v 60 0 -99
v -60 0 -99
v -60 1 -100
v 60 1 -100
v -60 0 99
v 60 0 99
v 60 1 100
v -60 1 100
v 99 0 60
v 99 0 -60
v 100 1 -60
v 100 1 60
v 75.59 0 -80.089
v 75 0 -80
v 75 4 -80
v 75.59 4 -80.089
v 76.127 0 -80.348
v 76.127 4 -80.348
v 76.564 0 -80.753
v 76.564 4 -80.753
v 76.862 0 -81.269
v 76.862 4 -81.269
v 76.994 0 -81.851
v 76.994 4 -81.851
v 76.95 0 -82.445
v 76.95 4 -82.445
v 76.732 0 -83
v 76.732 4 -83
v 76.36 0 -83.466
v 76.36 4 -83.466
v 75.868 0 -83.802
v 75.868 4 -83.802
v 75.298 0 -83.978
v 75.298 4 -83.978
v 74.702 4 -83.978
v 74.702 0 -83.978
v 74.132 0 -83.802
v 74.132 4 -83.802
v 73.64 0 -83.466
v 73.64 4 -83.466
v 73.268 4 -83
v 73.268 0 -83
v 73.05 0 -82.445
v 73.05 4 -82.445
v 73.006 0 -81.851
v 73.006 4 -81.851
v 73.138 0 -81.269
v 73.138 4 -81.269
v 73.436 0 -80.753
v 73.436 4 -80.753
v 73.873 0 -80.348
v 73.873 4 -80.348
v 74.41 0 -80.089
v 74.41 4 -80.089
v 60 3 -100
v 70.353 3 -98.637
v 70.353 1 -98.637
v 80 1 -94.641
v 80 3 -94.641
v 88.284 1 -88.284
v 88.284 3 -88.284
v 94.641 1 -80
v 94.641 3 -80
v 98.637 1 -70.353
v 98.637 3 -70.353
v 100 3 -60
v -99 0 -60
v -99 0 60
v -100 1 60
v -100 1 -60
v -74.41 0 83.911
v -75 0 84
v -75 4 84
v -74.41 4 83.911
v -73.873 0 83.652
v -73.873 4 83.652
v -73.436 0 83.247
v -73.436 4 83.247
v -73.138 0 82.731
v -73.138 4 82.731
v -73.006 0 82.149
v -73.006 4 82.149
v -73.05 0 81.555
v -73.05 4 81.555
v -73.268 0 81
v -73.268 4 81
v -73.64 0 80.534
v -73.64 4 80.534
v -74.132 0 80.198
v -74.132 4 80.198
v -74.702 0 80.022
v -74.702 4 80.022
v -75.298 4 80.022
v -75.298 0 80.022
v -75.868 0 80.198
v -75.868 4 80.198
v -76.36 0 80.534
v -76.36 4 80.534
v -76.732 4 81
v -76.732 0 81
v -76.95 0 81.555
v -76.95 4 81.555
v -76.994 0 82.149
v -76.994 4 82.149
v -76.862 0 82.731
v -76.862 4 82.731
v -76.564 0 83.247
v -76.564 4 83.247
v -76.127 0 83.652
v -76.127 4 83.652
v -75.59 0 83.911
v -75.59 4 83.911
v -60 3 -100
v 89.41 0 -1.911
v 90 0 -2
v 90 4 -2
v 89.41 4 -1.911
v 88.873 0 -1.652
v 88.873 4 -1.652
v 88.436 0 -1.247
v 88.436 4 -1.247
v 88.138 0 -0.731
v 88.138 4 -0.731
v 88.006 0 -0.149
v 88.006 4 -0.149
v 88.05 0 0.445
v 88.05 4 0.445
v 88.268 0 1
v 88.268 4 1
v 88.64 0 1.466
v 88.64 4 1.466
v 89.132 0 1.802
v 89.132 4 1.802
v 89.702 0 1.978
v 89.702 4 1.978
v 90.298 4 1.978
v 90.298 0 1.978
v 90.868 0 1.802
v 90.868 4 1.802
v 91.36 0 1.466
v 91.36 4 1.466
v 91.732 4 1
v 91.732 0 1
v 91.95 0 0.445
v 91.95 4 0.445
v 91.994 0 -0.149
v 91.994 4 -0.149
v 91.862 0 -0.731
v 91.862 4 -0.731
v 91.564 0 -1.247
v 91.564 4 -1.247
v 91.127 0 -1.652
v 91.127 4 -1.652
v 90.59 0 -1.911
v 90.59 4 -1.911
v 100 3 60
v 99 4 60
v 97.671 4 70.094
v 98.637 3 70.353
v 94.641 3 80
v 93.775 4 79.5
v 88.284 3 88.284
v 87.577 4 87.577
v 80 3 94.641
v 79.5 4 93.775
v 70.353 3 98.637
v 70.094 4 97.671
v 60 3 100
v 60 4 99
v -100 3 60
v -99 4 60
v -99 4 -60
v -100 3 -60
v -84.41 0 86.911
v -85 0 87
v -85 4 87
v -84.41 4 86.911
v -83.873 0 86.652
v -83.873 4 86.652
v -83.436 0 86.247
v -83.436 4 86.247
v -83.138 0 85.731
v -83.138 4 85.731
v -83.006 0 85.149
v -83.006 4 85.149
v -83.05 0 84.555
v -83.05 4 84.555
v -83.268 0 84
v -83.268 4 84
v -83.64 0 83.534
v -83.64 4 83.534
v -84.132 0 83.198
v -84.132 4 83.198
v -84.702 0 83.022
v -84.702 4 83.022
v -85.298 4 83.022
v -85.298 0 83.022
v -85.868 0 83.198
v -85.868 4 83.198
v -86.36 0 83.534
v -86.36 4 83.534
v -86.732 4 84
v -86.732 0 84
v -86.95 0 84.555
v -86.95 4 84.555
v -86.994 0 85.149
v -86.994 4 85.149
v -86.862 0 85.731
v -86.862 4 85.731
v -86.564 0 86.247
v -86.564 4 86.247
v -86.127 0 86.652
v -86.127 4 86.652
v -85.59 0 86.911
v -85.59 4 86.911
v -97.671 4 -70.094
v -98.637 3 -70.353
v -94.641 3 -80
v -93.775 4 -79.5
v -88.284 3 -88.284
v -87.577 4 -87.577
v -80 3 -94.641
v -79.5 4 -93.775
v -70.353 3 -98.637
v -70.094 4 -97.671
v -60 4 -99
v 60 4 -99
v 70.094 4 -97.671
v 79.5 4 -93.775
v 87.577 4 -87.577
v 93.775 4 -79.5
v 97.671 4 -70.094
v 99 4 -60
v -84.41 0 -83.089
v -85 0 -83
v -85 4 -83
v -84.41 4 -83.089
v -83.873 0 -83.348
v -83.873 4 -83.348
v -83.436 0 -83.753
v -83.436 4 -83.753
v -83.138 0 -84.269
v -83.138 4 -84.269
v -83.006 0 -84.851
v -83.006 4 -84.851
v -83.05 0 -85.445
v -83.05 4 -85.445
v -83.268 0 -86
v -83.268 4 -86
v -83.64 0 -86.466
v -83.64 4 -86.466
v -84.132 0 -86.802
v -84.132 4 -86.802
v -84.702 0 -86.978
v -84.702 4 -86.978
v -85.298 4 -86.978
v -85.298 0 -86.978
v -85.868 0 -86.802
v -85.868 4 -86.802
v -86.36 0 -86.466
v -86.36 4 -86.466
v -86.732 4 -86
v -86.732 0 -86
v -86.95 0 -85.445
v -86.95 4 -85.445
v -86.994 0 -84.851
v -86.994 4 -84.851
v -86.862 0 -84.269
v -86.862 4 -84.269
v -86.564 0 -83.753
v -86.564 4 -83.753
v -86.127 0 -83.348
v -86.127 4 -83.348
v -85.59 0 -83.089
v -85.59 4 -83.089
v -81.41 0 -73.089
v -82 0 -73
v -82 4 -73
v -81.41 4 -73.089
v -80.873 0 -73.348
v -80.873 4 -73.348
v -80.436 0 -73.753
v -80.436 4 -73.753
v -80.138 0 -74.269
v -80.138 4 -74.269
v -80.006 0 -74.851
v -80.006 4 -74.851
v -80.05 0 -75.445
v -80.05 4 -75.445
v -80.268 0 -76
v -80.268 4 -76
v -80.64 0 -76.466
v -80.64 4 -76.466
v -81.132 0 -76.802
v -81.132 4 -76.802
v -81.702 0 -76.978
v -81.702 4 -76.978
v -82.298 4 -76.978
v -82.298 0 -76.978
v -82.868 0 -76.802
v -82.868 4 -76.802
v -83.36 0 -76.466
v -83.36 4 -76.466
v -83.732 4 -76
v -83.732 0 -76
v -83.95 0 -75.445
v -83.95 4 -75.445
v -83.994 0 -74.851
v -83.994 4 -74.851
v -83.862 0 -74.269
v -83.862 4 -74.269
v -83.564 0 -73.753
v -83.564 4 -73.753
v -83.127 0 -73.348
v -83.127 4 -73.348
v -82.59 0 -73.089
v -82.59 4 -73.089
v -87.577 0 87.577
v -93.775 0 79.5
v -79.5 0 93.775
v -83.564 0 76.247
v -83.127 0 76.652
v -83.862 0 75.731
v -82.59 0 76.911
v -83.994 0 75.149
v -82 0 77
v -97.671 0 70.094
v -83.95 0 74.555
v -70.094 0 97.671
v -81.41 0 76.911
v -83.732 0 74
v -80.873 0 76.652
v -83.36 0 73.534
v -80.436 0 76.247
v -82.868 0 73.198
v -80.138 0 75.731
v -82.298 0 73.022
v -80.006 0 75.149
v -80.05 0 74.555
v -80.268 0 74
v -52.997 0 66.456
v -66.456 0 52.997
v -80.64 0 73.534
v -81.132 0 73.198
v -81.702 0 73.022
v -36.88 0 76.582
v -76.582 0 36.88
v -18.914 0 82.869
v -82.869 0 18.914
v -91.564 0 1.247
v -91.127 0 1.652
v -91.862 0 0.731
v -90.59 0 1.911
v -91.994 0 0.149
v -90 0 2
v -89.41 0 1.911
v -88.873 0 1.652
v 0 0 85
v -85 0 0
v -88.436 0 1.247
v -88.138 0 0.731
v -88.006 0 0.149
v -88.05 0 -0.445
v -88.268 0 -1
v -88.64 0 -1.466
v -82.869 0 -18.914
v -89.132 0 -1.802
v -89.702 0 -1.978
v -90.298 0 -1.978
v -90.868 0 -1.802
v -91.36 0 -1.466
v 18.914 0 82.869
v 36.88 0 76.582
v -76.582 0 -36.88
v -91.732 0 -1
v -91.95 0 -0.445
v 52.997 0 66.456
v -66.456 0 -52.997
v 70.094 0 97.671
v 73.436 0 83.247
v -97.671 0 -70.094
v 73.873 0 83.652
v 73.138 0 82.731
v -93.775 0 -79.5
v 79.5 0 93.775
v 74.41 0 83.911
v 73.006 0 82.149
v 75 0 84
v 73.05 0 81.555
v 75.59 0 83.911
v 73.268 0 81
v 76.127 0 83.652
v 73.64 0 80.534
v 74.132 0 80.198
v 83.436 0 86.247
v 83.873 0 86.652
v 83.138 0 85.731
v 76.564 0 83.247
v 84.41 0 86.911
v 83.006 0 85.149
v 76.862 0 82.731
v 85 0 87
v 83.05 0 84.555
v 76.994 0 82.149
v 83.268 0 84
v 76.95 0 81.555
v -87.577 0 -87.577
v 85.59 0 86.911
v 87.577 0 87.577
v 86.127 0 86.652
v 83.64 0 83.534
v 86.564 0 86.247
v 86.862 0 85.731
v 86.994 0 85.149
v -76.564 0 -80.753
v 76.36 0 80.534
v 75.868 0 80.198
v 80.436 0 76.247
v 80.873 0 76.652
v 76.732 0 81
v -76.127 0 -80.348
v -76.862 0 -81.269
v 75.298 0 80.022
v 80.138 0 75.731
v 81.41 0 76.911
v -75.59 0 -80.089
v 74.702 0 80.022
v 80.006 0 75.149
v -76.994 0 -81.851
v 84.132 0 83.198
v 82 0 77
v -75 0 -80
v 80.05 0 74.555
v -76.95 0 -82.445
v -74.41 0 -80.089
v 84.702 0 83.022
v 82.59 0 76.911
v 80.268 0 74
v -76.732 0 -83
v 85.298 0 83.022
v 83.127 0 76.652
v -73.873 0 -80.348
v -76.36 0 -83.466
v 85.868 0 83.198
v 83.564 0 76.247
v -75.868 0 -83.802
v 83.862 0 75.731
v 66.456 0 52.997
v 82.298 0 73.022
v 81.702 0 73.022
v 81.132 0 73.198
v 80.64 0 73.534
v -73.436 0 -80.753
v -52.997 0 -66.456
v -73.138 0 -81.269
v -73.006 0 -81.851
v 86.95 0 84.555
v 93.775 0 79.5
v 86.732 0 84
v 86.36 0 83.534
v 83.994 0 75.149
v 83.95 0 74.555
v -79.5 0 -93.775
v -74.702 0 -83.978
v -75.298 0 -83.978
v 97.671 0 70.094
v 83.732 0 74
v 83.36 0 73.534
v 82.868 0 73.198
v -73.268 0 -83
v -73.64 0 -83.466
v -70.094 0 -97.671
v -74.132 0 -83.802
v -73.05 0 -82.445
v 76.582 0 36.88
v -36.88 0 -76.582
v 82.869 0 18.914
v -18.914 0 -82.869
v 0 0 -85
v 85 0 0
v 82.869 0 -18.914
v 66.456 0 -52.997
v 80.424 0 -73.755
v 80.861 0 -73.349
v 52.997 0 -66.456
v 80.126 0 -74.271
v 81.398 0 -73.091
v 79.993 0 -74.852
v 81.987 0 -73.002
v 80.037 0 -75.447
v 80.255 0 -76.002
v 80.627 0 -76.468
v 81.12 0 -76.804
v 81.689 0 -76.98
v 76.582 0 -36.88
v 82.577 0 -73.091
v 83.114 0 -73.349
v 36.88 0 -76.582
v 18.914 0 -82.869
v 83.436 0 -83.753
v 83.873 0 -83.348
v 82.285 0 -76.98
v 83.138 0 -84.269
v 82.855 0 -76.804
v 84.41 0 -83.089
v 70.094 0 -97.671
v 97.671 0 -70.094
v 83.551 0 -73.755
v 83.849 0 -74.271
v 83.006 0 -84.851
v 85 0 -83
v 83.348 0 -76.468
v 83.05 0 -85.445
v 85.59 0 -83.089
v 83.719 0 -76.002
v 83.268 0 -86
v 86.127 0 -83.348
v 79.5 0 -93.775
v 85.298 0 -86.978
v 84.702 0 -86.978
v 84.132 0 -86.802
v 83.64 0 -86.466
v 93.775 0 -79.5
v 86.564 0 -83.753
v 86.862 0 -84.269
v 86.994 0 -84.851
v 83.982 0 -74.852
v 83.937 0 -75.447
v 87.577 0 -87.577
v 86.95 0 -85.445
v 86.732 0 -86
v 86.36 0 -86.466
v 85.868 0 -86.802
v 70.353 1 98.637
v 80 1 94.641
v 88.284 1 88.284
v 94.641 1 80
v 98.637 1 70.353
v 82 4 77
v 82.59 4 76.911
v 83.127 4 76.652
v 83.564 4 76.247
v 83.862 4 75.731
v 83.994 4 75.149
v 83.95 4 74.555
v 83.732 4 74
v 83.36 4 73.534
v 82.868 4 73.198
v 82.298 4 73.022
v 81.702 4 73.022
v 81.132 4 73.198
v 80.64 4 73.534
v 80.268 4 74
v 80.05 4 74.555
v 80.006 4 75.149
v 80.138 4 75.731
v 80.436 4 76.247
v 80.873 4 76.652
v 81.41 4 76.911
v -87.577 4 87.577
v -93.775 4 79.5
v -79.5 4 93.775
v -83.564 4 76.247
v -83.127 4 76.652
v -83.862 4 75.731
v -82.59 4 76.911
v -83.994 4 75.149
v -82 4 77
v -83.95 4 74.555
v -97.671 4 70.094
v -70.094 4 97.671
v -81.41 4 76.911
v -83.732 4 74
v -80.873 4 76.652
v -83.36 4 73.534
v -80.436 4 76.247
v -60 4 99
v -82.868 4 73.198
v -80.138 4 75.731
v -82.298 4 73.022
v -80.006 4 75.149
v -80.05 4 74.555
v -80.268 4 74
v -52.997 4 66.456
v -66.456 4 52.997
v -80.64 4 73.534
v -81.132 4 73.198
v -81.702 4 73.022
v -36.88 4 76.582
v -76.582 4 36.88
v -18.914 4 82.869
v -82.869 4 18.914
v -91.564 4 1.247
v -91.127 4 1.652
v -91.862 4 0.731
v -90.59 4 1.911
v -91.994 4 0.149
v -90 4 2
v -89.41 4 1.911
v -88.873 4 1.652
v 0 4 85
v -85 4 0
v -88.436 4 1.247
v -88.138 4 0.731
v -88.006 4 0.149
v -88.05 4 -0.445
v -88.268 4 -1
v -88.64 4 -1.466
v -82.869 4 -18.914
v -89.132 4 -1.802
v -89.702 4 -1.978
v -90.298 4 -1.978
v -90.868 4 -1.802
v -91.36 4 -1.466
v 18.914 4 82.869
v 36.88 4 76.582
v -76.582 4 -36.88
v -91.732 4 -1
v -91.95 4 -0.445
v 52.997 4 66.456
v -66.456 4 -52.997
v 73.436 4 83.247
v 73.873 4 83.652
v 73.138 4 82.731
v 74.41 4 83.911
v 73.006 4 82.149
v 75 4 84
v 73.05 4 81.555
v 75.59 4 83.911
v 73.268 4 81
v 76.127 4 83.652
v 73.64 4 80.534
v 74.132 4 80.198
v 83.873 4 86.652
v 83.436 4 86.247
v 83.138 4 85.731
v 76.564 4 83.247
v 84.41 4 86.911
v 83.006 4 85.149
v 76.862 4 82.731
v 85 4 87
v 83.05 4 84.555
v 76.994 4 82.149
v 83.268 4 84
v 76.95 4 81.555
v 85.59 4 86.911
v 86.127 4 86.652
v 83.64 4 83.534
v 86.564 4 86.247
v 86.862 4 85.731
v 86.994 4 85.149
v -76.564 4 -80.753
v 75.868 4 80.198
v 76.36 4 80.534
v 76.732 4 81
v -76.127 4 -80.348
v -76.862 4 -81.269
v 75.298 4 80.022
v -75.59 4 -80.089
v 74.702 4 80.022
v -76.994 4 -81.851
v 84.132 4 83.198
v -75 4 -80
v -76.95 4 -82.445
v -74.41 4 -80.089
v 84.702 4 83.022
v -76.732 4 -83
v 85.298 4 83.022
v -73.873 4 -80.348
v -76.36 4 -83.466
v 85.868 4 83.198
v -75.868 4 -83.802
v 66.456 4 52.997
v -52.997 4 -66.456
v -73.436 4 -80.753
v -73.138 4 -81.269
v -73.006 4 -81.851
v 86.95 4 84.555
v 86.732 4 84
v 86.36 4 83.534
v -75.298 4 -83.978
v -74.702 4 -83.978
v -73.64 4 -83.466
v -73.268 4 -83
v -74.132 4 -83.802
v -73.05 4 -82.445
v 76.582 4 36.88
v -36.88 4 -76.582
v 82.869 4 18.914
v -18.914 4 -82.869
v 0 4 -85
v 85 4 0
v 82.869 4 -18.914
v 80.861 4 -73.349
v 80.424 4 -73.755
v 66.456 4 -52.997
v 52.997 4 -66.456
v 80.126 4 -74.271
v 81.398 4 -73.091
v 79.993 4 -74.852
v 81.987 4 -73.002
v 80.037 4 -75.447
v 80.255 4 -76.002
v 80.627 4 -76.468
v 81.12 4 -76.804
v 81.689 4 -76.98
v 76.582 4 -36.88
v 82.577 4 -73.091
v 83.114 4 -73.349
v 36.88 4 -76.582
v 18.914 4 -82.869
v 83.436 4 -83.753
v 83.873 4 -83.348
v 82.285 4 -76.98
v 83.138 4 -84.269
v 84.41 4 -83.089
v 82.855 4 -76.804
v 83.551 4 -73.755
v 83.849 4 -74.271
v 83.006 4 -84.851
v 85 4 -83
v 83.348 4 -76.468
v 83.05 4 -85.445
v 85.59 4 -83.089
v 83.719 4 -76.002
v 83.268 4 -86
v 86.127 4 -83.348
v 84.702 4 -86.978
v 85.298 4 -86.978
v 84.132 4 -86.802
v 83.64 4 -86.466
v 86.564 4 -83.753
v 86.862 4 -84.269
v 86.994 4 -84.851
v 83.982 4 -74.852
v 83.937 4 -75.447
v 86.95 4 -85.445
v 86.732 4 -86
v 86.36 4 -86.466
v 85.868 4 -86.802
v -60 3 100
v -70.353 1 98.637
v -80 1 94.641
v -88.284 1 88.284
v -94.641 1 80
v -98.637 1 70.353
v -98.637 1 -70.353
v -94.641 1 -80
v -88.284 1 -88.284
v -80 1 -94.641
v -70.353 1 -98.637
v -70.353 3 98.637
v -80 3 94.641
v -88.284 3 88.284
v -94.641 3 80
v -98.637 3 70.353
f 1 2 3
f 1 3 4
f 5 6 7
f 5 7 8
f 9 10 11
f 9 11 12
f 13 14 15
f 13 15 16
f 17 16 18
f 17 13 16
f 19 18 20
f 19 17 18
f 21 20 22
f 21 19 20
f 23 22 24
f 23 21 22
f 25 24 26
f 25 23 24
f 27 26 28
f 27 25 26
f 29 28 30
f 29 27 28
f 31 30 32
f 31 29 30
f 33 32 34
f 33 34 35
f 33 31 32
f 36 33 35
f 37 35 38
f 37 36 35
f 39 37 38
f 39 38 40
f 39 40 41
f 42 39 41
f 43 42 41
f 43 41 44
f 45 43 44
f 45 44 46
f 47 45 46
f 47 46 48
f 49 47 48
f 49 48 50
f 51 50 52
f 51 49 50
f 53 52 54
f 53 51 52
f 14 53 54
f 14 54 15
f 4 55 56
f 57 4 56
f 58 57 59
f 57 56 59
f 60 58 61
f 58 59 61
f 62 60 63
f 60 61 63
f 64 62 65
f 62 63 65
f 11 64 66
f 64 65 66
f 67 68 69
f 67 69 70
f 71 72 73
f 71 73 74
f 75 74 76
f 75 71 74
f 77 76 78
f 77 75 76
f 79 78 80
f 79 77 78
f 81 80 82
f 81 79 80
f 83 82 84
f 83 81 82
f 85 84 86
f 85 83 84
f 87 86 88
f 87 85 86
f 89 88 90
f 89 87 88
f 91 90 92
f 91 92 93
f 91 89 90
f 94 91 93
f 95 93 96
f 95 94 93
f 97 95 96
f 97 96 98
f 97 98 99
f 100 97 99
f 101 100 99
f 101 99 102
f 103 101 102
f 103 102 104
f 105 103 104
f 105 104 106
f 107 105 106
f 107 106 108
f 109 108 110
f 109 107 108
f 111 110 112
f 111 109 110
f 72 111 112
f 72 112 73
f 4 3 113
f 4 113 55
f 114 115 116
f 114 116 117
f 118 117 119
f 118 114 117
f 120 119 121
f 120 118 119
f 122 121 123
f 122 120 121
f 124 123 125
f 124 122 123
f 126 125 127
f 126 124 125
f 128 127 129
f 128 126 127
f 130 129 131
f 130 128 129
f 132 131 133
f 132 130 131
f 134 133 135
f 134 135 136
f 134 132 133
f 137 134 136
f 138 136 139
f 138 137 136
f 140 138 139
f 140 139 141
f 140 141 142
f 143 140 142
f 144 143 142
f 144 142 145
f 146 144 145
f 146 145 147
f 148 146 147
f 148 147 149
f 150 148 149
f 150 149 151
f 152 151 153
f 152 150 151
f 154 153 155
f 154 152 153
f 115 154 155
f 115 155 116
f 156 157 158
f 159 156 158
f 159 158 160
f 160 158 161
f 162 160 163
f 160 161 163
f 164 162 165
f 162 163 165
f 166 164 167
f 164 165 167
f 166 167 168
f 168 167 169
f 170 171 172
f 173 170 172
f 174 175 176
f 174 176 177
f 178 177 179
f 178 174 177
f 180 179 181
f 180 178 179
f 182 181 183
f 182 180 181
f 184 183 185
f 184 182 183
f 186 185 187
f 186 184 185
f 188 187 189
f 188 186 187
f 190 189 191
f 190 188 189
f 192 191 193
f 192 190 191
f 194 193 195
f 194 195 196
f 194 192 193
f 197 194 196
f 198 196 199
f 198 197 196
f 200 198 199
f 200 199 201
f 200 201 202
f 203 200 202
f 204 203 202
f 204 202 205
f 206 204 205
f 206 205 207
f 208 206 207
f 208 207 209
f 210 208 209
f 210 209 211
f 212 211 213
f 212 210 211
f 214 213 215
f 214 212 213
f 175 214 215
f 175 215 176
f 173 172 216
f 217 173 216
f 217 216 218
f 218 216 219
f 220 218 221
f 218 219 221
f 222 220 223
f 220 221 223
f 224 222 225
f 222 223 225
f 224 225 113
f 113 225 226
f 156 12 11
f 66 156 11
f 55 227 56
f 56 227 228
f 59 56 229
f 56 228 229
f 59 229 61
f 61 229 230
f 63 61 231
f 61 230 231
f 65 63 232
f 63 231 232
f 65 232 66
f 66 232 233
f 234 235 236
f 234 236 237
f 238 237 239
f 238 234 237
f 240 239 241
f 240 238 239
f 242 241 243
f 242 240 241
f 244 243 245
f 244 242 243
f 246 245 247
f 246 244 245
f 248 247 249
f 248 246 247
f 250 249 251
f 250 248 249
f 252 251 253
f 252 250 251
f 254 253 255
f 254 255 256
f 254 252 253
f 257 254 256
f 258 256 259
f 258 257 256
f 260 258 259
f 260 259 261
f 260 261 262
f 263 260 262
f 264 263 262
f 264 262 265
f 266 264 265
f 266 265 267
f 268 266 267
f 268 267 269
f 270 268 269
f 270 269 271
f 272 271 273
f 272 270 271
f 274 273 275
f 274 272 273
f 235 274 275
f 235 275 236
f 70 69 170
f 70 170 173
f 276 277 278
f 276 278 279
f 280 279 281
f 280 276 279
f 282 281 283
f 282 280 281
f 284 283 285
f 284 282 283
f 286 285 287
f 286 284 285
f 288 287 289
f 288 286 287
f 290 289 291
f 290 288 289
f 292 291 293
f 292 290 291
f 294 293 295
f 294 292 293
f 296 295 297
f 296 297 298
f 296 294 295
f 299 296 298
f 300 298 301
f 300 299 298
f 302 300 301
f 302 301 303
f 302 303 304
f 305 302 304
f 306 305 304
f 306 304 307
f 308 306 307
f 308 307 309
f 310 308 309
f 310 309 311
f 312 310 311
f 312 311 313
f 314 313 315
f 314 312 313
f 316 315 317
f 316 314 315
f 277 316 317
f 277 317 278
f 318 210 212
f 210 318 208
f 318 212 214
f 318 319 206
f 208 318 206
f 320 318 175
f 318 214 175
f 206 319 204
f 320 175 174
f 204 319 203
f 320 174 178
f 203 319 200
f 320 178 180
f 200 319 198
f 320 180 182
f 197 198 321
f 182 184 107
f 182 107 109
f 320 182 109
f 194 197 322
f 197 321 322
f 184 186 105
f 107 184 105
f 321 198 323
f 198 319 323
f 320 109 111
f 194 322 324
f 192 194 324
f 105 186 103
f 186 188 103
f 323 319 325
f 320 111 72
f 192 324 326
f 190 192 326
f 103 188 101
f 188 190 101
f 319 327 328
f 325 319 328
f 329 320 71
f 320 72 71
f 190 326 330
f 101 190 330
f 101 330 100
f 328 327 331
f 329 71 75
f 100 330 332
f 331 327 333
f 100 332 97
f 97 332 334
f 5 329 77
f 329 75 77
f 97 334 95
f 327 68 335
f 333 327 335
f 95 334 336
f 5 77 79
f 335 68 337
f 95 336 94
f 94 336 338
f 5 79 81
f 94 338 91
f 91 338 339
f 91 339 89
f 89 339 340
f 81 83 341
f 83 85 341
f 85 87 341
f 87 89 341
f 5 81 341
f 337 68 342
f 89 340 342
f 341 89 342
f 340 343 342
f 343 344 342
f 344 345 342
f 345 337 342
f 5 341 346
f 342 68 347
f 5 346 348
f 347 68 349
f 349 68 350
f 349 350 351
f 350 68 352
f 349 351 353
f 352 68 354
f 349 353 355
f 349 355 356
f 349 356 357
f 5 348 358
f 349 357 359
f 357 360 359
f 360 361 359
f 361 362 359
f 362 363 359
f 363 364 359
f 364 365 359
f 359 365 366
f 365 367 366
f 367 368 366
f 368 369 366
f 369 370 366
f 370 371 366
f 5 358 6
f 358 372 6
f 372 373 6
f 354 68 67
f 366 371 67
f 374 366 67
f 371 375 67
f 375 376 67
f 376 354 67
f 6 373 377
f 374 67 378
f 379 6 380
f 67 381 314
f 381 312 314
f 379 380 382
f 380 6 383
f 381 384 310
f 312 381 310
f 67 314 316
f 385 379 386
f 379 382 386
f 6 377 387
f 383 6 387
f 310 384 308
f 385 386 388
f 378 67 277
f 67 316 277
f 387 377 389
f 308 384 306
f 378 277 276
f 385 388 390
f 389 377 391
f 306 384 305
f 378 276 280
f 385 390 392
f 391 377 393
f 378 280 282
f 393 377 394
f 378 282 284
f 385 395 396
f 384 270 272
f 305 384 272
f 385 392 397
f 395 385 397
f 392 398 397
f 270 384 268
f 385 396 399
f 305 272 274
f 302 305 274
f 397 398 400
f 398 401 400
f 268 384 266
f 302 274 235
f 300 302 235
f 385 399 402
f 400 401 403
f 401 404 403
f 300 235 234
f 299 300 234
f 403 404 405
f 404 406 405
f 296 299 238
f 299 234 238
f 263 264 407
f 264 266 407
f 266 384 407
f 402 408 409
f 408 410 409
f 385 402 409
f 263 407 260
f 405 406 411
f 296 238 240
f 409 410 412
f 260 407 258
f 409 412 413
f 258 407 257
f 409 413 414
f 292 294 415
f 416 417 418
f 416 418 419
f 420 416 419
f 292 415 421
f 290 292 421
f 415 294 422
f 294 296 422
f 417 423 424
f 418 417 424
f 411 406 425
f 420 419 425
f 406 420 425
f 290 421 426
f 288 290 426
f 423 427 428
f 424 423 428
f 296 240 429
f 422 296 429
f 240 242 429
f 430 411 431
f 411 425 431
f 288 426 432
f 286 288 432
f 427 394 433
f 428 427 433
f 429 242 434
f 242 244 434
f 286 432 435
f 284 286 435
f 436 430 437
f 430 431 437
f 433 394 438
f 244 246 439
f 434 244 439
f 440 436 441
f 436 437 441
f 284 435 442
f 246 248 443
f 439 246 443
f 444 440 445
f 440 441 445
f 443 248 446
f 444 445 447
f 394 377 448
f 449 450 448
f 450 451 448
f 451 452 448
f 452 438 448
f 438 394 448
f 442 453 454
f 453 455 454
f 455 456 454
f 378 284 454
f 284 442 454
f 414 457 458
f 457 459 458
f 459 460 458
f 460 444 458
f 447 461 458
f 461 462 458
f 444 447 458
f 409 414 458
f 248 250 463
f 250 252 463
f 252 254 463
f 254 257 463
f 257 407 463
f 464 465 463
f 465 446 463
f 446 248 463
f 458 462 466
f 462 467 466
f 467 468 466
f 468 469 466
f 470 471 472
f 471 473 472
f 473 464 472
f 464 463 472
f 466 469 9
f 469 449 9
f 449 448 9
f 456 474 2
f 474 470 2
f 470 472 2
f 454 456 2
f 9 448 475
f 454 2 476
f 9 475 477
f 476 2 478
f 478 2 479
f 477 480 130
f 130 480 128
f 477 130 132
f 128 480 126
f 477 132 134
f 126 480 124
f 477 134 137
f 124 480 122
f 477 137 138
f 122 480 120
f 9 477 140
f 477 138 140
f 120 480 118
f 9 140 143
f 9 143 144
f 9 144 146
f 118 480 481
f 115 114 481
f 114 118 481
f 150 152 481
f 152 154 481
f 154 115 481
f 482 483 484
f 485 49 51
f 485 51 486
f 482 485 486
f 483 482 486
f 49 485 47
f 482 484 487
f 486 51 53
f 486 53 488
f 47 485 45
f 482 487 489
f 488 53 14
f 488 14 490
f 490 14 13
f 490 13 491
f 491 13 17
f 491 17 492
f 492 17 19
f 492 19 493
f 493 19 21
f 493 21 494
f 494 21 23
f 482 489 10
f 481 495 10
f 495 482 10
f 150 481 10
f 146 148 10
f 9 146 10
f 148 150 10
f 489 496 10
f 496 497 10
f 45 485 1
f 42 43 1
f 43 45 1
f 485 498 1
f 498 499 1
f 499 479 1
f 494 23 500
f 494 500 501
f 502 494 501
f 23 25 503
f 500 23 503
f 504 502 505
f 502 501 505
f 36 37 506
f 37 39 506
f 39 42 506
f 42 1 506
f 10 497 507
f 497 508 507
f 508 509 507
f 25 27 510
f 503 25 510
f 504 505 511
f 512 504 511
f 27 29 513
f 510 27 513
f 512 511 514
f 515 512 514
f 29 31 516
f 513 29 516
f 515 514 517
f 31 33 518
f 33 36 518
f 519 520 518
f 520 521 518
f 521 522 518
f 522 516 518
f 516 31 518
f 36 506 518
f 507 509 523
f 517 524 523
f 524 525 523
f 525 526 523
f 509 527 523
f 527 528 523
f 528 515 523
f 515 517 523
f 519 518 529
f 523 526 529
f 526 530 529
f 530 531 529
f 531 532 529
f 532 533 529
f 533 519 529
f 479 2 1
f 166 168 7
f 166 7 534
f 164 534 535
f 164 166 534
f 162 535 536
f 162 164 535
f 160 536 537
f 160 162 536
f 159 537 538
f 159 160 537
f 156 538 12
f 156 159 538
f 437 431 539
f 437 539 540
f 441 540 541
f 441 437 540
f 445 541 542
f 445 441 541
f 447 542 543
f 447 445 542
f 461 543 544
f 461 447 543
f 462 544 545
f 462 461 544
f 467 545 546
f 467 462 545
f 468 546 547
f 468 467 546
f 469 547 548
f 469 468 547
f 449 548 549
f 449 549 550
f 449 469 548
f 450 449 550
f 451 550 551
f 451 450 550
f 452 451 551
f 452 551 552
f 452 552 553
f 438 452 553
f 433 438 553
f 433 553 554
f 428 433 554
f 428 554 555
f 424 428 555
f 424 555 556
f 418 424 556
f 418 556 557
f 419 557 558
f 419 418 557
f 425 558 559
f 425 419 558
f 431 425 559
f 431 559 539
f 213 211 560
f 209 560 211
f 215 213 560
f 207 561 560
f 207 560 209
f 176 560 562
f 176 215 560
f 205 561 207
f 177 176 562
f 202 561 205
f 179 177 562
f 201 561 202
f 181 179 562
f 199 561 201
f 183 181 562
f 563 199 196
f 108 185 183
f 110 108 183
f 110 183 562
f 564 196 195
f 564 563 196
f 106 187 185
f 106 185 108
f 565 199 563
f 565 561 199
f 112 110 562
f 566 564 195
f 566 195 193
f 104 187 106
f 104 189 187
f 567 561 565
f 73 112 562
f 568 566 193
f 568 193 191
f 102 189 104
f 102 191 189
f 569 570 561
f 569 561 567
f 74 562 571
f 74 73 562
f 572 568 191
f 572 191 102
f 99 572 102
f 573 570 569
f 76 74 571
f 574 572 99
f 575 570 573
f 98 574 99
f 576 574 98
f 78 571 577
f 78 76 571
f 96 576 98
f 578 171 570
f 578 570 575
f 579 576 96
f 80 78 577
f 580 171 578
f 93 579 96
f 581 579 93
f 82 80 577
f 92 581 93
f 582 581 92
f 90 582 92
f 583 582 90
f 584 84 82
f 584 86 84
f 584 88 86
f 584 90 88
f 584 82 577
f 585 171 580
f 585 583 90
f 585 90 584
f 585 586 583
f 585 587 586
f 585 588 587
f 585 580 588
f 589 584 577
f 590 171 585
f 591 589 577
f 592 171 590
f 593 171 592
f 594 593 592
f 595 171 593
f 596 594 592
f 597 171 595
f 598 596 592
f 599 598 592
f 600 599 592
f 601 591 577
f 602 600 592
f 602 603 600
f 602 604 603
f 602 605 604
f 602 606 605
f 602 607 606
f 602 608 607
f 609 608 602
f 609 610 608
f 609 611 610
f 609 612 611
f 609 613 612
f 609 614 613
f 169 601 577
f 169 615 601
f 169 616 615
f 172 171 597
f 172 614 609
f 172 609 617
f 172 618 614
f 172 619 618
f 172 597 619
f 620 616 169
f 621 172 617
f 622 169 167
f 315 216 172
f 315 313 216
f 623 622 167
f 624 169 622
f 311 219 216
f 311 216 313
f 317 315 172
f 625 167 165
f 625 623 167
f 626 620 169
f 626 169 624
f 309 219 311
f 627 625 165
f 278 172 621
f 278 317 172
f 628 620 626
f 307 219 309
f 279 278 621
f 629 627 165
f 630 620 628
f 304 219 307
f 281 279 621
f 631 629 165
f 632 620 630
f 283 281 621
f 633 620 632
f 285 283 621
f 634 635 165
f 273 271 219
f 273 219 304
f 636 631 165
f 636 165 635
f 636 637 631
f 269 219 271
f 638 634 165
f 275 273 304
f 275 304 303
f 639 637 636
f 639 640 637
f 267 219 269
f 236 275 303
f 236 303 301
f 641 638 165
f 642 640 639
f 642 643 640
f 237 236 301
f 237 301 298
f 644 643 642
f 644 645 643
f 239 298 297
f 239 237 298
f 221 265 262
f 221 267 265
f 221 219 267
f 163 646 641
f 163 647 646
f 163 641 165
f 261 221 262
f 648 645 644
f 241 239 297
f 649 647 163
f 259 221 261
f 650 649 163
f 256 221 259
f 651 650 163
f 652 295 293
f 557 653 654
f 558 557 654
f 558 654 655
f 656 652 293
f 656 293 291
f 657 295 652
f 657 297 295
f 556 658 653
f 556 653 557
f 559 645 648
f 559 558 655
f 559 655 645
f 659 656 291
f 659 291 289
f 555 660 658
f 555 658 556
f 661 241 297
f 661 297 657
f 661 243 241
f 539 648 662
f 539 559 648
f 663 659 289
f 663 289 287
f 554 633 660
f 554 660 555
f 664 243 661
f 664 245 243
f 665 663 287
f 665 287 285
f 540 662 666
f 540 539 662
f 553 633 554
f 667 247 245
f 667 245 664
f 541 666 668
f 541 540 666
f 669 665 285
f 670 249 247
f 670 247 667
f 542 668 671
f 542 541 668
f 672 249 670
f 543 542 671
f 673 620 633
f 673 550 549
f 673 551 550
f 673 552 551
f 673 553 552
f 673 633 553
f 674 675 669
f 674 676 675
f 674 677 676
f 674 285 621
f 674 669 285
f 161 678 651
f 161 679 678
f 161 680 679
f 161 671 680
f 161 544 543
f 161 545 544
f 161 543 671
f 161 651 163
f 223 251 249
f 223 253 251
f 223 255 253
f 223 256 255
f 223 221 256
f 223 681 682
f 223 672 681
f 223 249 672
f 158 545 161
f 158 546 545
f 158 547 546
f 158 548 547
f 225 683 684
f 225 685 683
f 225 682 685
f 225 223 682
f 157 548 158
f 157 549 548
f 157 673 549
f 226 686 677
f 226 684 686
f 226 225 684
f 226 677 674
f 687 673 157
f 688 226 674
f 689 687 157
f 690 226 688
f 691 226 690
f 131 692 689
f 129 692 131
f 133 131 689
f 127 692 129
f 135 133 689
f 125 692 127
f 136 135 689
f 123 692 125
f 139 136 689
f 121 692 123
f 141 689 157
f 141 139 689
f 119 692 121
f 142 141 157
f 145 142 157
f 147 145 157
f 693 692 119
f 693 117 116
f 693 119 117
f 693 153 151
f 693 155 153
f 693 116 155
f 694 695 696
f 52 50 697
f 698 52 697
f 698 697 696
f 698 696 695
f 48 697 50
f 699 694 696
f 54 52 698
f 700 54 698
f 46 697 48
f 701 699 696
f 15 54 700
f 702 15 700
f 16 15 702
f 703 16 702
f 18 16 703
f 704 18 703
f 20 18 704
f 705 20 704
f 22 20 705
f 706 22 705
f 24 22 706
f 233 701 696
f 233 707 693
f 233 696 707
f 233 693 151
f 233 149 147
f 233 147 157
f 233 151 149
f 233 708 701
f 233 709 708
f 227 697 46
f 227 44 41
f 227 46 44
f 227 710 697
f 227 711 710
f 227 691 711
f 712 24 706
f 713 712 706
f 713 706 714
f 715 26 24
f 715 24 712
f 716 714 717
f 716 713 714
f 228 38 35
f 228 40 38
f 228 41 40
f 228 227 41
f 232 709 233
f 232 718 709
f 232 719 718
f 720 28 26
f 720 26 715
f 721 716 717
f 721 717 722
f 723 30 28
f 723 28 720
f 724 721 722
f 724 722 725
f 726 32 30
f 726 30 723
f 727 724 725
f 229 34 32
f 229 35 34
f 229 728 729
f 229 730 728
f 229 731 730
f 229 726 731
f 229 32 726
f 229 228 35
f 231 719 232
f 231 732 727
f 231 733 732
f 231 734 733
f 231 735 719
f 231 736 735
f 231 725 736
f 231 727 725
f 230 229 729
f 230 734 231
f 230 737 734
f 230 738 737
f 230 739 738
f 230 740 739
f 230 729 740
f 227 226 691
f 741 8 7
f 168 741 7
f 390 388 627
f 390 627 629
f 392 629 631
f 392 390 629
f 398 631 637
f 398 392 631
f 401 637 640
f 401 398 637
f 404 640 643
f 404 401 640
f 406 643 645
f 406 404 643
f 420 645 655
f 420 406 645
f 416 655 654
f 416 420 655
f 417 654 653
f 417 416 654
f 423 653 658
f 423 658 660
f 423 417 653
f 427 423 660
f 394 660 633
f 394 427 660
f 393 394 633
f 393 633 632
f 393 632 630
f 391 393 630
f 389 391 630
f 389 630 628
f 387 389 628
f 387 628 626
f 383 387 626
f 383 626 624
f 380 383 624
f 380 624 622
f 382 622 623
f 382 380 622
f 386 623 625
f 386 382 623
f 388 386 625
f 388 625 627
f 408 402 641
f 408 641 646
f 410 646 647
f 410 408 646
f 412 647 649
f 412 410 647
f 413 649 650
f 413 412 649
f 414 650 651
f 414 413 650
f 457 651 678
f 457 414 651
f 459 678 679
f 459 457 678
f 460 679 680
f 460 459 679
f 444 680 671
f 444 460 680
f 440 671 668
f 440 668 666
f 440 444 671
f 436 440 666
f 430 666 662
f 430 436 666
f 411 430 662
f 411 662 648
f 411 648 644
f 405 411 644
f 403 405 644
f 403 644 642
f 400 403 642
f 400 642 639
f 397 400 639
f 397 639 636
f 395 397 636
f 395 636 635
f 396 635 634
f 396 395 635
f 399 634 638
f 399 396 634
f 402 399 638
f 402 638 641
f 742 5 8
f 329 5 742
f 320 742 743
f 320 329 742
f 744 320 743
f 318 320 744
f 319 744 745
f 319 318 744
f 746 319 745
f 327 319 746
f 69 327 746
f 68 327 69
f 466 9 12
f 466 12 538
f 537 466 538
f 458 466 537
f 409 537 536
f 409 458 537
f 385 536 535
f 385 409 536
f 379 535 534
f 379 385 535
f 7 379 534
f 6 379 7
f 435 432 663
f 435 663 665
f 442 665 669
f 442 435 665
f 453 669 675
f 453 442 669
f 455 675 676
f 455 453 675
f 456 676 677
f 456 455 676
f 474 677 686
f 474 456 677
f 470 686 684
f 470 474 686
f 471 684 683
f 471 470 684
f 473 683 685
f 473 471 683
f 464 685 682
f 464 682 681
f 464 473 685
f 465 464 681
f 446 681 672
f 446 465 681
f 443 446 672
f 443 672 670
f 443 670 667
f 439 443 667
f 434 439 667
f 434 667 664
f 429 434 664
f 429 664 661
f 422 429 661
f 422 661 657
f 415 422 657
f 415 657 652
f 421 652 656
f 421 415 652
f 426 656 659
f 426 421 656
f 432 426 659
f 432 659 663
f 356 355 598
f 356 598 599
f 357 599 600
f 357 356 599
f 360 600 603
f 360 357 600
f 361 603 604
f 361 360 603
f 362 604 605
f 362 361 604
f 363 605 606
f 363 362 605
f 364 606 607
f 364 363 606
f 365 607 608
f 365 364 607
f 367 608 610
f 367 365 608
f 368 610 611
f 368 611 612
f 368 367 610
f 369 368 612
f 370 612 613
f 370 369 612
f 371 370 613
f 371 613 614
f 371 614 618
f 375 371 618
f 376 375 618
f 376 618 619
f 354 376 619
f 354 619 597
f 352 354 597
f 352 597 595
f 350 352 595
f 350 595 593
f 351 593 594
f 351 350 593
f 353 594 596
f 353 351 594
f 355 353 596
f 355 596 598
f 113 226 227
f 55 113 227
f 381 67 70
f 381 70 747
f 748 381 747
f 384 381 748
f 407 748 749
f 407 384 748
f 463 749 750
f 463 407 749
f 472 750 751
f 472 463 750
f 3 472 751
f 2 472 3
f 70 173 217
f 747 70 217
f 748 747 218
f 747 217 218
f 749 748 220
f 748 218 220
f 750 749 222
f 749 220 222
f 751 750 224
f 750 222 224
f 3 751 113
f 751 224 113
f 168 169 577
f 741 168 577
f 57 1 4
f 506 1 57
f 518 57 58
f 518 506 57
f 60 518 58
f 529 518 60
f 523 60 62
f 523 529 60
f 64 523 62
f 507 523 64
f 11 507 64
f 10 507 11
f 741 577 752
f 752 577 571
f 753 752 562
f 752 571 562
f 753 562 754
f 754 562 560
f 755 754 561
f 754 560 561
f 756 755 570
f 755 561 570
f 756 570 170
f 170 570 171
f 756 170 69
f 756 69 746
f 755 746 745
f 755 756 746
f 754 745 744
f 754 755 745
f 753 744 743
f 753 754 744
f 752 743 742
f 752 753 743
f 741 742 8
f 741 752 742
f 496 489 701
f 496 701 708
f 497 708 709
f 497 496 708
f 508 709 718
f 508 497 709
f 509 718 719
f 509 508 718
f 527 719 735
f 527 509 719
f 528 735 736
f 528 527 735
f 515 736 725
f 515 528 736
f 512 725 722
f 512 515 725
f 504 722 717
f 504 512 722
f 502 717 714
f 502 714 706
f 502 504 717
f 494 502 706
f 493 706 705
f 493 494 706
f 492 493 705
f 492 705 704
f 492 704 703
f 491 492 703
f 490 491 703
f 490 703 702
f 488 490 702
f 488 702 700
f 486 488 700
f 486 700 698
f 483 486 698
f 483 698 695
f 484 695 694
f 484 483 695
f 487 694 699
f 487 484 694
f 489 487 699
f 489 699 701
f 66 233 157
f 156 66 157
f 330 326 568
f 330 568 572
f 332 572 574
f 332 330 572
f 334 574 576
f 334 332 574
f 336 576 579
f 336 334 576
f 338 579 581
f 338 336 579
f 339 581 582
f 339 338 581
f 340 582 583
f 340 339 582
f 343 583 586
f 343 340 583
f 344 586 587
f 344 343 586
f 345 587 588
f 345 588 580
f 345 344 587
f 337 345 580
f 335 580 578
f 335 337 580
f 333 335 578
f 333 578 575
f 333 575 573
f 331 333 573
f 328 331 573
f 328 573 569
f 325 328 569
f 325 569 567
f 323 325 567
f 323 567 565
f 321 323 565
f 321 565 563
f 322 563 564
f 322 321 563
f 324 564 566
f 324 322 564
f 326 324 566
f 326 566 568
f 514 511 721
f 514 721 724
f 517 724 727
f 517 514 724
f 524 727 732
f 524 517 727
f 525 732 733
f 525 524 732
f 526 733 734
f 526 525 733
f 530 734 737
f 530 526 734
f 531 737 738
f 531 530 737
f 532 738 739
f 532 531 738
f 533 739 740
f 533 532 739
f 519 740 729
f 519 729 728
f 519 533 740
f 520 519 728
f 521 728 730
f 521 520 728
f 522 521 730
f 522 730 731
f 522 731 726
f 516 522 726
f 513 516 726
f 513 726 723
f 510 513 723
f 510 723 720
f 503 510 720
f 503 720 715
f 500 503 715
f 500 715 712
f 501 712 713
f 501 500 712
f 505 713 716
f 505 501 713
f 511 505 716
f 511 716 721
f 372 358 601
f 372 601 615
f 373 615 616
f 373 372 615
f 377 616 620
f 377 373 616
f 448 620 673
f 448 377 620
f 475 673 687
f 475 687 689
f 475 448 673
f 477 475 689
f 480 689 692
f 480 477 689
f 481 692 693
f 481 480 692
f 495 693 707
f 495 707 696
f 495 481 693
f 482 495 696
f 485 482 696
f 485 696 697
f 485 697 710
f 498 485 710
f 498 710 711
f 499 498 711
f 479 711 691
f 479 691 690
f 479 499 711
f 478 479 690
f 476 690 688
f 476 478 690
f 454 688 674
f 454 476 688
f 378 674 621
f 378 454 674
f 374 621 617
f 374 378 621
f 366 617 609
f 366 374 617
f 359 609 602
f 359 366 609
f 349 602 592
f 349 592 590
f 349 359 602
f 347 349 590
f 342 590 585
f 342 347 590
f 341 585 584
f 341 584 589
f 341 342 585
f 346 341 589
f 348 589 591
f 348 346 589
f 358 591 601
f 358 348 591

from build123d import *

# Parameters (mm, degrees)
SKETCH_1_W      = 200
SKETCH_1_H      = 200
SKETCH_1_R      = 2
SKETCH_1_R_2    = 85
EXTRUDE_1_DEPTH = 4
FILLET_1_R      = 40
CHAMFER_1_SIZE  = 1


with BuildPart() as part:
    # Эскиз1 → Бобышка-Вытянуть1 (new body)
    with BuildSketch(Plane(origin=(0, 0, 0), x_dir=(1, 0, 0), z_dir=(0, 1, 0))):
        Rectangle(SKETCH_1_W, SKETCH_1_H)
        with Locations(Location((-85, 85, 0), (0, 0, 270))):
            Circle(SKETCH_1_R, mode=Mode.SUBTRACT)
        with Locations(Location((85, 85, 0), (0, 0, 270))):
            Circle(SKETCH_1_R, mode=Mode.SUBTRACT)
        with Locations(Location((85, -85, 0), (0, 0, 270))):
            Circle(SKETCH_1_R, mode=Mode.SUBTRACT)
        with Locations(Location((-85, -85, 0), (0, 0, 270))):
            Circle(SKETCH_1_R, mode=Mode.SUBTRACT)
        with Locations(Location((-90, 0, 0), (0, 0, 270))):
            Circle(SKETCH_1_R, mode=Mode.SUBTRACT)
        with Locations(Location((90, 0, 0), (0, 0, 90))):
            Circle(SKETCH_1_R, mode=Mode.SUBTRACT)
        with Locations(Location((75, 82, 0), (0, 0, 270))):
            Circle(SKETCH_1_R, mode=Mode.SUBTRACT)
        with Locations(Location((-75, 82, 0), (0, 0, 270))):
            Circle(SKETCH_1_R, mode=Mode.SUBTRACT)
        with Locations(Location((75, -82, 0), (0, 0, 270))):
            Circle(SKETCH_1_R, mode=Mode.SUBTRACT)
        with Locations(Location((-75, -82, 0), (0, 0, 270))):
            Circle(SKETCH_1_R, mode=Mode.SUBTRACT)
        with Locations(Location((82, -75, 0), (0, 0, 270))):
            Circle(SKETCH_1_R, mode=Mode.SUBTRACT)
        with Locations(Location((-82, -75, 0), (0, 0, 270))):
            Circle(SKETCH_1_R, mode=Mode.SUBTRACT)
        with Locations(Location((-82, 75, 0), (0, 0, 270))):
            Circle(SKETCH_1_R, mode=Mode.SUBTRACT)
        with Locations(Location((81.987312617, 75.001883036, 0), (0, 0, 270))):
            Circle(SKETCH_1_R, mode=Mode.SUBTRACT)
        with Locations(Location((0, 0, 0), (0, 0, 270))):
            Circle(SKETCH_1_R_2, mode=Mode.SUBTRACT)
    extrude(amount=EXTRUDE_1_DEPTH)

    # Скругление1
    fillet_1_edges = [part.edges().sort_by_distance(p)[0] for p in [
        (100, 2, 100),
        (-100, 2, 100),
        (-100, 2, -100),
        (100, 2, -100),
    ]]
    fillet(fillet_1_edges, radius=FILLET_1_R)

    # Фаска1
    chamfer_1_edges = [part.edges().sort_by_distance(p)[0] for p in [
        (-100, 0, 0),
        (-100, 4, 0),
        (100, 0, 0),
        (0, 0, 100),
        (0, 0, -100),
        (88.284271247, 0, 88.284271247),
        (88.284271247, 0, -88.284271247),
        (-88.284271247, 0, 88.284271247),
        (-88.284271247, 0, -88.284271247),
        (0, 4, -100),
        (100, 4, 0),
        (0, 4, 100),
        (88.284271247, 4, 88.284271247),
        (88.284271247, 4, -88.284271247),
        (-88.284271247, 4, 88.284271247),
        (-88.284271247, 4, -88.284271247),
    ]]
    chamfer(chamfer_1_edges, length=CHAMFER_1_SIZE)


solid = part.part
